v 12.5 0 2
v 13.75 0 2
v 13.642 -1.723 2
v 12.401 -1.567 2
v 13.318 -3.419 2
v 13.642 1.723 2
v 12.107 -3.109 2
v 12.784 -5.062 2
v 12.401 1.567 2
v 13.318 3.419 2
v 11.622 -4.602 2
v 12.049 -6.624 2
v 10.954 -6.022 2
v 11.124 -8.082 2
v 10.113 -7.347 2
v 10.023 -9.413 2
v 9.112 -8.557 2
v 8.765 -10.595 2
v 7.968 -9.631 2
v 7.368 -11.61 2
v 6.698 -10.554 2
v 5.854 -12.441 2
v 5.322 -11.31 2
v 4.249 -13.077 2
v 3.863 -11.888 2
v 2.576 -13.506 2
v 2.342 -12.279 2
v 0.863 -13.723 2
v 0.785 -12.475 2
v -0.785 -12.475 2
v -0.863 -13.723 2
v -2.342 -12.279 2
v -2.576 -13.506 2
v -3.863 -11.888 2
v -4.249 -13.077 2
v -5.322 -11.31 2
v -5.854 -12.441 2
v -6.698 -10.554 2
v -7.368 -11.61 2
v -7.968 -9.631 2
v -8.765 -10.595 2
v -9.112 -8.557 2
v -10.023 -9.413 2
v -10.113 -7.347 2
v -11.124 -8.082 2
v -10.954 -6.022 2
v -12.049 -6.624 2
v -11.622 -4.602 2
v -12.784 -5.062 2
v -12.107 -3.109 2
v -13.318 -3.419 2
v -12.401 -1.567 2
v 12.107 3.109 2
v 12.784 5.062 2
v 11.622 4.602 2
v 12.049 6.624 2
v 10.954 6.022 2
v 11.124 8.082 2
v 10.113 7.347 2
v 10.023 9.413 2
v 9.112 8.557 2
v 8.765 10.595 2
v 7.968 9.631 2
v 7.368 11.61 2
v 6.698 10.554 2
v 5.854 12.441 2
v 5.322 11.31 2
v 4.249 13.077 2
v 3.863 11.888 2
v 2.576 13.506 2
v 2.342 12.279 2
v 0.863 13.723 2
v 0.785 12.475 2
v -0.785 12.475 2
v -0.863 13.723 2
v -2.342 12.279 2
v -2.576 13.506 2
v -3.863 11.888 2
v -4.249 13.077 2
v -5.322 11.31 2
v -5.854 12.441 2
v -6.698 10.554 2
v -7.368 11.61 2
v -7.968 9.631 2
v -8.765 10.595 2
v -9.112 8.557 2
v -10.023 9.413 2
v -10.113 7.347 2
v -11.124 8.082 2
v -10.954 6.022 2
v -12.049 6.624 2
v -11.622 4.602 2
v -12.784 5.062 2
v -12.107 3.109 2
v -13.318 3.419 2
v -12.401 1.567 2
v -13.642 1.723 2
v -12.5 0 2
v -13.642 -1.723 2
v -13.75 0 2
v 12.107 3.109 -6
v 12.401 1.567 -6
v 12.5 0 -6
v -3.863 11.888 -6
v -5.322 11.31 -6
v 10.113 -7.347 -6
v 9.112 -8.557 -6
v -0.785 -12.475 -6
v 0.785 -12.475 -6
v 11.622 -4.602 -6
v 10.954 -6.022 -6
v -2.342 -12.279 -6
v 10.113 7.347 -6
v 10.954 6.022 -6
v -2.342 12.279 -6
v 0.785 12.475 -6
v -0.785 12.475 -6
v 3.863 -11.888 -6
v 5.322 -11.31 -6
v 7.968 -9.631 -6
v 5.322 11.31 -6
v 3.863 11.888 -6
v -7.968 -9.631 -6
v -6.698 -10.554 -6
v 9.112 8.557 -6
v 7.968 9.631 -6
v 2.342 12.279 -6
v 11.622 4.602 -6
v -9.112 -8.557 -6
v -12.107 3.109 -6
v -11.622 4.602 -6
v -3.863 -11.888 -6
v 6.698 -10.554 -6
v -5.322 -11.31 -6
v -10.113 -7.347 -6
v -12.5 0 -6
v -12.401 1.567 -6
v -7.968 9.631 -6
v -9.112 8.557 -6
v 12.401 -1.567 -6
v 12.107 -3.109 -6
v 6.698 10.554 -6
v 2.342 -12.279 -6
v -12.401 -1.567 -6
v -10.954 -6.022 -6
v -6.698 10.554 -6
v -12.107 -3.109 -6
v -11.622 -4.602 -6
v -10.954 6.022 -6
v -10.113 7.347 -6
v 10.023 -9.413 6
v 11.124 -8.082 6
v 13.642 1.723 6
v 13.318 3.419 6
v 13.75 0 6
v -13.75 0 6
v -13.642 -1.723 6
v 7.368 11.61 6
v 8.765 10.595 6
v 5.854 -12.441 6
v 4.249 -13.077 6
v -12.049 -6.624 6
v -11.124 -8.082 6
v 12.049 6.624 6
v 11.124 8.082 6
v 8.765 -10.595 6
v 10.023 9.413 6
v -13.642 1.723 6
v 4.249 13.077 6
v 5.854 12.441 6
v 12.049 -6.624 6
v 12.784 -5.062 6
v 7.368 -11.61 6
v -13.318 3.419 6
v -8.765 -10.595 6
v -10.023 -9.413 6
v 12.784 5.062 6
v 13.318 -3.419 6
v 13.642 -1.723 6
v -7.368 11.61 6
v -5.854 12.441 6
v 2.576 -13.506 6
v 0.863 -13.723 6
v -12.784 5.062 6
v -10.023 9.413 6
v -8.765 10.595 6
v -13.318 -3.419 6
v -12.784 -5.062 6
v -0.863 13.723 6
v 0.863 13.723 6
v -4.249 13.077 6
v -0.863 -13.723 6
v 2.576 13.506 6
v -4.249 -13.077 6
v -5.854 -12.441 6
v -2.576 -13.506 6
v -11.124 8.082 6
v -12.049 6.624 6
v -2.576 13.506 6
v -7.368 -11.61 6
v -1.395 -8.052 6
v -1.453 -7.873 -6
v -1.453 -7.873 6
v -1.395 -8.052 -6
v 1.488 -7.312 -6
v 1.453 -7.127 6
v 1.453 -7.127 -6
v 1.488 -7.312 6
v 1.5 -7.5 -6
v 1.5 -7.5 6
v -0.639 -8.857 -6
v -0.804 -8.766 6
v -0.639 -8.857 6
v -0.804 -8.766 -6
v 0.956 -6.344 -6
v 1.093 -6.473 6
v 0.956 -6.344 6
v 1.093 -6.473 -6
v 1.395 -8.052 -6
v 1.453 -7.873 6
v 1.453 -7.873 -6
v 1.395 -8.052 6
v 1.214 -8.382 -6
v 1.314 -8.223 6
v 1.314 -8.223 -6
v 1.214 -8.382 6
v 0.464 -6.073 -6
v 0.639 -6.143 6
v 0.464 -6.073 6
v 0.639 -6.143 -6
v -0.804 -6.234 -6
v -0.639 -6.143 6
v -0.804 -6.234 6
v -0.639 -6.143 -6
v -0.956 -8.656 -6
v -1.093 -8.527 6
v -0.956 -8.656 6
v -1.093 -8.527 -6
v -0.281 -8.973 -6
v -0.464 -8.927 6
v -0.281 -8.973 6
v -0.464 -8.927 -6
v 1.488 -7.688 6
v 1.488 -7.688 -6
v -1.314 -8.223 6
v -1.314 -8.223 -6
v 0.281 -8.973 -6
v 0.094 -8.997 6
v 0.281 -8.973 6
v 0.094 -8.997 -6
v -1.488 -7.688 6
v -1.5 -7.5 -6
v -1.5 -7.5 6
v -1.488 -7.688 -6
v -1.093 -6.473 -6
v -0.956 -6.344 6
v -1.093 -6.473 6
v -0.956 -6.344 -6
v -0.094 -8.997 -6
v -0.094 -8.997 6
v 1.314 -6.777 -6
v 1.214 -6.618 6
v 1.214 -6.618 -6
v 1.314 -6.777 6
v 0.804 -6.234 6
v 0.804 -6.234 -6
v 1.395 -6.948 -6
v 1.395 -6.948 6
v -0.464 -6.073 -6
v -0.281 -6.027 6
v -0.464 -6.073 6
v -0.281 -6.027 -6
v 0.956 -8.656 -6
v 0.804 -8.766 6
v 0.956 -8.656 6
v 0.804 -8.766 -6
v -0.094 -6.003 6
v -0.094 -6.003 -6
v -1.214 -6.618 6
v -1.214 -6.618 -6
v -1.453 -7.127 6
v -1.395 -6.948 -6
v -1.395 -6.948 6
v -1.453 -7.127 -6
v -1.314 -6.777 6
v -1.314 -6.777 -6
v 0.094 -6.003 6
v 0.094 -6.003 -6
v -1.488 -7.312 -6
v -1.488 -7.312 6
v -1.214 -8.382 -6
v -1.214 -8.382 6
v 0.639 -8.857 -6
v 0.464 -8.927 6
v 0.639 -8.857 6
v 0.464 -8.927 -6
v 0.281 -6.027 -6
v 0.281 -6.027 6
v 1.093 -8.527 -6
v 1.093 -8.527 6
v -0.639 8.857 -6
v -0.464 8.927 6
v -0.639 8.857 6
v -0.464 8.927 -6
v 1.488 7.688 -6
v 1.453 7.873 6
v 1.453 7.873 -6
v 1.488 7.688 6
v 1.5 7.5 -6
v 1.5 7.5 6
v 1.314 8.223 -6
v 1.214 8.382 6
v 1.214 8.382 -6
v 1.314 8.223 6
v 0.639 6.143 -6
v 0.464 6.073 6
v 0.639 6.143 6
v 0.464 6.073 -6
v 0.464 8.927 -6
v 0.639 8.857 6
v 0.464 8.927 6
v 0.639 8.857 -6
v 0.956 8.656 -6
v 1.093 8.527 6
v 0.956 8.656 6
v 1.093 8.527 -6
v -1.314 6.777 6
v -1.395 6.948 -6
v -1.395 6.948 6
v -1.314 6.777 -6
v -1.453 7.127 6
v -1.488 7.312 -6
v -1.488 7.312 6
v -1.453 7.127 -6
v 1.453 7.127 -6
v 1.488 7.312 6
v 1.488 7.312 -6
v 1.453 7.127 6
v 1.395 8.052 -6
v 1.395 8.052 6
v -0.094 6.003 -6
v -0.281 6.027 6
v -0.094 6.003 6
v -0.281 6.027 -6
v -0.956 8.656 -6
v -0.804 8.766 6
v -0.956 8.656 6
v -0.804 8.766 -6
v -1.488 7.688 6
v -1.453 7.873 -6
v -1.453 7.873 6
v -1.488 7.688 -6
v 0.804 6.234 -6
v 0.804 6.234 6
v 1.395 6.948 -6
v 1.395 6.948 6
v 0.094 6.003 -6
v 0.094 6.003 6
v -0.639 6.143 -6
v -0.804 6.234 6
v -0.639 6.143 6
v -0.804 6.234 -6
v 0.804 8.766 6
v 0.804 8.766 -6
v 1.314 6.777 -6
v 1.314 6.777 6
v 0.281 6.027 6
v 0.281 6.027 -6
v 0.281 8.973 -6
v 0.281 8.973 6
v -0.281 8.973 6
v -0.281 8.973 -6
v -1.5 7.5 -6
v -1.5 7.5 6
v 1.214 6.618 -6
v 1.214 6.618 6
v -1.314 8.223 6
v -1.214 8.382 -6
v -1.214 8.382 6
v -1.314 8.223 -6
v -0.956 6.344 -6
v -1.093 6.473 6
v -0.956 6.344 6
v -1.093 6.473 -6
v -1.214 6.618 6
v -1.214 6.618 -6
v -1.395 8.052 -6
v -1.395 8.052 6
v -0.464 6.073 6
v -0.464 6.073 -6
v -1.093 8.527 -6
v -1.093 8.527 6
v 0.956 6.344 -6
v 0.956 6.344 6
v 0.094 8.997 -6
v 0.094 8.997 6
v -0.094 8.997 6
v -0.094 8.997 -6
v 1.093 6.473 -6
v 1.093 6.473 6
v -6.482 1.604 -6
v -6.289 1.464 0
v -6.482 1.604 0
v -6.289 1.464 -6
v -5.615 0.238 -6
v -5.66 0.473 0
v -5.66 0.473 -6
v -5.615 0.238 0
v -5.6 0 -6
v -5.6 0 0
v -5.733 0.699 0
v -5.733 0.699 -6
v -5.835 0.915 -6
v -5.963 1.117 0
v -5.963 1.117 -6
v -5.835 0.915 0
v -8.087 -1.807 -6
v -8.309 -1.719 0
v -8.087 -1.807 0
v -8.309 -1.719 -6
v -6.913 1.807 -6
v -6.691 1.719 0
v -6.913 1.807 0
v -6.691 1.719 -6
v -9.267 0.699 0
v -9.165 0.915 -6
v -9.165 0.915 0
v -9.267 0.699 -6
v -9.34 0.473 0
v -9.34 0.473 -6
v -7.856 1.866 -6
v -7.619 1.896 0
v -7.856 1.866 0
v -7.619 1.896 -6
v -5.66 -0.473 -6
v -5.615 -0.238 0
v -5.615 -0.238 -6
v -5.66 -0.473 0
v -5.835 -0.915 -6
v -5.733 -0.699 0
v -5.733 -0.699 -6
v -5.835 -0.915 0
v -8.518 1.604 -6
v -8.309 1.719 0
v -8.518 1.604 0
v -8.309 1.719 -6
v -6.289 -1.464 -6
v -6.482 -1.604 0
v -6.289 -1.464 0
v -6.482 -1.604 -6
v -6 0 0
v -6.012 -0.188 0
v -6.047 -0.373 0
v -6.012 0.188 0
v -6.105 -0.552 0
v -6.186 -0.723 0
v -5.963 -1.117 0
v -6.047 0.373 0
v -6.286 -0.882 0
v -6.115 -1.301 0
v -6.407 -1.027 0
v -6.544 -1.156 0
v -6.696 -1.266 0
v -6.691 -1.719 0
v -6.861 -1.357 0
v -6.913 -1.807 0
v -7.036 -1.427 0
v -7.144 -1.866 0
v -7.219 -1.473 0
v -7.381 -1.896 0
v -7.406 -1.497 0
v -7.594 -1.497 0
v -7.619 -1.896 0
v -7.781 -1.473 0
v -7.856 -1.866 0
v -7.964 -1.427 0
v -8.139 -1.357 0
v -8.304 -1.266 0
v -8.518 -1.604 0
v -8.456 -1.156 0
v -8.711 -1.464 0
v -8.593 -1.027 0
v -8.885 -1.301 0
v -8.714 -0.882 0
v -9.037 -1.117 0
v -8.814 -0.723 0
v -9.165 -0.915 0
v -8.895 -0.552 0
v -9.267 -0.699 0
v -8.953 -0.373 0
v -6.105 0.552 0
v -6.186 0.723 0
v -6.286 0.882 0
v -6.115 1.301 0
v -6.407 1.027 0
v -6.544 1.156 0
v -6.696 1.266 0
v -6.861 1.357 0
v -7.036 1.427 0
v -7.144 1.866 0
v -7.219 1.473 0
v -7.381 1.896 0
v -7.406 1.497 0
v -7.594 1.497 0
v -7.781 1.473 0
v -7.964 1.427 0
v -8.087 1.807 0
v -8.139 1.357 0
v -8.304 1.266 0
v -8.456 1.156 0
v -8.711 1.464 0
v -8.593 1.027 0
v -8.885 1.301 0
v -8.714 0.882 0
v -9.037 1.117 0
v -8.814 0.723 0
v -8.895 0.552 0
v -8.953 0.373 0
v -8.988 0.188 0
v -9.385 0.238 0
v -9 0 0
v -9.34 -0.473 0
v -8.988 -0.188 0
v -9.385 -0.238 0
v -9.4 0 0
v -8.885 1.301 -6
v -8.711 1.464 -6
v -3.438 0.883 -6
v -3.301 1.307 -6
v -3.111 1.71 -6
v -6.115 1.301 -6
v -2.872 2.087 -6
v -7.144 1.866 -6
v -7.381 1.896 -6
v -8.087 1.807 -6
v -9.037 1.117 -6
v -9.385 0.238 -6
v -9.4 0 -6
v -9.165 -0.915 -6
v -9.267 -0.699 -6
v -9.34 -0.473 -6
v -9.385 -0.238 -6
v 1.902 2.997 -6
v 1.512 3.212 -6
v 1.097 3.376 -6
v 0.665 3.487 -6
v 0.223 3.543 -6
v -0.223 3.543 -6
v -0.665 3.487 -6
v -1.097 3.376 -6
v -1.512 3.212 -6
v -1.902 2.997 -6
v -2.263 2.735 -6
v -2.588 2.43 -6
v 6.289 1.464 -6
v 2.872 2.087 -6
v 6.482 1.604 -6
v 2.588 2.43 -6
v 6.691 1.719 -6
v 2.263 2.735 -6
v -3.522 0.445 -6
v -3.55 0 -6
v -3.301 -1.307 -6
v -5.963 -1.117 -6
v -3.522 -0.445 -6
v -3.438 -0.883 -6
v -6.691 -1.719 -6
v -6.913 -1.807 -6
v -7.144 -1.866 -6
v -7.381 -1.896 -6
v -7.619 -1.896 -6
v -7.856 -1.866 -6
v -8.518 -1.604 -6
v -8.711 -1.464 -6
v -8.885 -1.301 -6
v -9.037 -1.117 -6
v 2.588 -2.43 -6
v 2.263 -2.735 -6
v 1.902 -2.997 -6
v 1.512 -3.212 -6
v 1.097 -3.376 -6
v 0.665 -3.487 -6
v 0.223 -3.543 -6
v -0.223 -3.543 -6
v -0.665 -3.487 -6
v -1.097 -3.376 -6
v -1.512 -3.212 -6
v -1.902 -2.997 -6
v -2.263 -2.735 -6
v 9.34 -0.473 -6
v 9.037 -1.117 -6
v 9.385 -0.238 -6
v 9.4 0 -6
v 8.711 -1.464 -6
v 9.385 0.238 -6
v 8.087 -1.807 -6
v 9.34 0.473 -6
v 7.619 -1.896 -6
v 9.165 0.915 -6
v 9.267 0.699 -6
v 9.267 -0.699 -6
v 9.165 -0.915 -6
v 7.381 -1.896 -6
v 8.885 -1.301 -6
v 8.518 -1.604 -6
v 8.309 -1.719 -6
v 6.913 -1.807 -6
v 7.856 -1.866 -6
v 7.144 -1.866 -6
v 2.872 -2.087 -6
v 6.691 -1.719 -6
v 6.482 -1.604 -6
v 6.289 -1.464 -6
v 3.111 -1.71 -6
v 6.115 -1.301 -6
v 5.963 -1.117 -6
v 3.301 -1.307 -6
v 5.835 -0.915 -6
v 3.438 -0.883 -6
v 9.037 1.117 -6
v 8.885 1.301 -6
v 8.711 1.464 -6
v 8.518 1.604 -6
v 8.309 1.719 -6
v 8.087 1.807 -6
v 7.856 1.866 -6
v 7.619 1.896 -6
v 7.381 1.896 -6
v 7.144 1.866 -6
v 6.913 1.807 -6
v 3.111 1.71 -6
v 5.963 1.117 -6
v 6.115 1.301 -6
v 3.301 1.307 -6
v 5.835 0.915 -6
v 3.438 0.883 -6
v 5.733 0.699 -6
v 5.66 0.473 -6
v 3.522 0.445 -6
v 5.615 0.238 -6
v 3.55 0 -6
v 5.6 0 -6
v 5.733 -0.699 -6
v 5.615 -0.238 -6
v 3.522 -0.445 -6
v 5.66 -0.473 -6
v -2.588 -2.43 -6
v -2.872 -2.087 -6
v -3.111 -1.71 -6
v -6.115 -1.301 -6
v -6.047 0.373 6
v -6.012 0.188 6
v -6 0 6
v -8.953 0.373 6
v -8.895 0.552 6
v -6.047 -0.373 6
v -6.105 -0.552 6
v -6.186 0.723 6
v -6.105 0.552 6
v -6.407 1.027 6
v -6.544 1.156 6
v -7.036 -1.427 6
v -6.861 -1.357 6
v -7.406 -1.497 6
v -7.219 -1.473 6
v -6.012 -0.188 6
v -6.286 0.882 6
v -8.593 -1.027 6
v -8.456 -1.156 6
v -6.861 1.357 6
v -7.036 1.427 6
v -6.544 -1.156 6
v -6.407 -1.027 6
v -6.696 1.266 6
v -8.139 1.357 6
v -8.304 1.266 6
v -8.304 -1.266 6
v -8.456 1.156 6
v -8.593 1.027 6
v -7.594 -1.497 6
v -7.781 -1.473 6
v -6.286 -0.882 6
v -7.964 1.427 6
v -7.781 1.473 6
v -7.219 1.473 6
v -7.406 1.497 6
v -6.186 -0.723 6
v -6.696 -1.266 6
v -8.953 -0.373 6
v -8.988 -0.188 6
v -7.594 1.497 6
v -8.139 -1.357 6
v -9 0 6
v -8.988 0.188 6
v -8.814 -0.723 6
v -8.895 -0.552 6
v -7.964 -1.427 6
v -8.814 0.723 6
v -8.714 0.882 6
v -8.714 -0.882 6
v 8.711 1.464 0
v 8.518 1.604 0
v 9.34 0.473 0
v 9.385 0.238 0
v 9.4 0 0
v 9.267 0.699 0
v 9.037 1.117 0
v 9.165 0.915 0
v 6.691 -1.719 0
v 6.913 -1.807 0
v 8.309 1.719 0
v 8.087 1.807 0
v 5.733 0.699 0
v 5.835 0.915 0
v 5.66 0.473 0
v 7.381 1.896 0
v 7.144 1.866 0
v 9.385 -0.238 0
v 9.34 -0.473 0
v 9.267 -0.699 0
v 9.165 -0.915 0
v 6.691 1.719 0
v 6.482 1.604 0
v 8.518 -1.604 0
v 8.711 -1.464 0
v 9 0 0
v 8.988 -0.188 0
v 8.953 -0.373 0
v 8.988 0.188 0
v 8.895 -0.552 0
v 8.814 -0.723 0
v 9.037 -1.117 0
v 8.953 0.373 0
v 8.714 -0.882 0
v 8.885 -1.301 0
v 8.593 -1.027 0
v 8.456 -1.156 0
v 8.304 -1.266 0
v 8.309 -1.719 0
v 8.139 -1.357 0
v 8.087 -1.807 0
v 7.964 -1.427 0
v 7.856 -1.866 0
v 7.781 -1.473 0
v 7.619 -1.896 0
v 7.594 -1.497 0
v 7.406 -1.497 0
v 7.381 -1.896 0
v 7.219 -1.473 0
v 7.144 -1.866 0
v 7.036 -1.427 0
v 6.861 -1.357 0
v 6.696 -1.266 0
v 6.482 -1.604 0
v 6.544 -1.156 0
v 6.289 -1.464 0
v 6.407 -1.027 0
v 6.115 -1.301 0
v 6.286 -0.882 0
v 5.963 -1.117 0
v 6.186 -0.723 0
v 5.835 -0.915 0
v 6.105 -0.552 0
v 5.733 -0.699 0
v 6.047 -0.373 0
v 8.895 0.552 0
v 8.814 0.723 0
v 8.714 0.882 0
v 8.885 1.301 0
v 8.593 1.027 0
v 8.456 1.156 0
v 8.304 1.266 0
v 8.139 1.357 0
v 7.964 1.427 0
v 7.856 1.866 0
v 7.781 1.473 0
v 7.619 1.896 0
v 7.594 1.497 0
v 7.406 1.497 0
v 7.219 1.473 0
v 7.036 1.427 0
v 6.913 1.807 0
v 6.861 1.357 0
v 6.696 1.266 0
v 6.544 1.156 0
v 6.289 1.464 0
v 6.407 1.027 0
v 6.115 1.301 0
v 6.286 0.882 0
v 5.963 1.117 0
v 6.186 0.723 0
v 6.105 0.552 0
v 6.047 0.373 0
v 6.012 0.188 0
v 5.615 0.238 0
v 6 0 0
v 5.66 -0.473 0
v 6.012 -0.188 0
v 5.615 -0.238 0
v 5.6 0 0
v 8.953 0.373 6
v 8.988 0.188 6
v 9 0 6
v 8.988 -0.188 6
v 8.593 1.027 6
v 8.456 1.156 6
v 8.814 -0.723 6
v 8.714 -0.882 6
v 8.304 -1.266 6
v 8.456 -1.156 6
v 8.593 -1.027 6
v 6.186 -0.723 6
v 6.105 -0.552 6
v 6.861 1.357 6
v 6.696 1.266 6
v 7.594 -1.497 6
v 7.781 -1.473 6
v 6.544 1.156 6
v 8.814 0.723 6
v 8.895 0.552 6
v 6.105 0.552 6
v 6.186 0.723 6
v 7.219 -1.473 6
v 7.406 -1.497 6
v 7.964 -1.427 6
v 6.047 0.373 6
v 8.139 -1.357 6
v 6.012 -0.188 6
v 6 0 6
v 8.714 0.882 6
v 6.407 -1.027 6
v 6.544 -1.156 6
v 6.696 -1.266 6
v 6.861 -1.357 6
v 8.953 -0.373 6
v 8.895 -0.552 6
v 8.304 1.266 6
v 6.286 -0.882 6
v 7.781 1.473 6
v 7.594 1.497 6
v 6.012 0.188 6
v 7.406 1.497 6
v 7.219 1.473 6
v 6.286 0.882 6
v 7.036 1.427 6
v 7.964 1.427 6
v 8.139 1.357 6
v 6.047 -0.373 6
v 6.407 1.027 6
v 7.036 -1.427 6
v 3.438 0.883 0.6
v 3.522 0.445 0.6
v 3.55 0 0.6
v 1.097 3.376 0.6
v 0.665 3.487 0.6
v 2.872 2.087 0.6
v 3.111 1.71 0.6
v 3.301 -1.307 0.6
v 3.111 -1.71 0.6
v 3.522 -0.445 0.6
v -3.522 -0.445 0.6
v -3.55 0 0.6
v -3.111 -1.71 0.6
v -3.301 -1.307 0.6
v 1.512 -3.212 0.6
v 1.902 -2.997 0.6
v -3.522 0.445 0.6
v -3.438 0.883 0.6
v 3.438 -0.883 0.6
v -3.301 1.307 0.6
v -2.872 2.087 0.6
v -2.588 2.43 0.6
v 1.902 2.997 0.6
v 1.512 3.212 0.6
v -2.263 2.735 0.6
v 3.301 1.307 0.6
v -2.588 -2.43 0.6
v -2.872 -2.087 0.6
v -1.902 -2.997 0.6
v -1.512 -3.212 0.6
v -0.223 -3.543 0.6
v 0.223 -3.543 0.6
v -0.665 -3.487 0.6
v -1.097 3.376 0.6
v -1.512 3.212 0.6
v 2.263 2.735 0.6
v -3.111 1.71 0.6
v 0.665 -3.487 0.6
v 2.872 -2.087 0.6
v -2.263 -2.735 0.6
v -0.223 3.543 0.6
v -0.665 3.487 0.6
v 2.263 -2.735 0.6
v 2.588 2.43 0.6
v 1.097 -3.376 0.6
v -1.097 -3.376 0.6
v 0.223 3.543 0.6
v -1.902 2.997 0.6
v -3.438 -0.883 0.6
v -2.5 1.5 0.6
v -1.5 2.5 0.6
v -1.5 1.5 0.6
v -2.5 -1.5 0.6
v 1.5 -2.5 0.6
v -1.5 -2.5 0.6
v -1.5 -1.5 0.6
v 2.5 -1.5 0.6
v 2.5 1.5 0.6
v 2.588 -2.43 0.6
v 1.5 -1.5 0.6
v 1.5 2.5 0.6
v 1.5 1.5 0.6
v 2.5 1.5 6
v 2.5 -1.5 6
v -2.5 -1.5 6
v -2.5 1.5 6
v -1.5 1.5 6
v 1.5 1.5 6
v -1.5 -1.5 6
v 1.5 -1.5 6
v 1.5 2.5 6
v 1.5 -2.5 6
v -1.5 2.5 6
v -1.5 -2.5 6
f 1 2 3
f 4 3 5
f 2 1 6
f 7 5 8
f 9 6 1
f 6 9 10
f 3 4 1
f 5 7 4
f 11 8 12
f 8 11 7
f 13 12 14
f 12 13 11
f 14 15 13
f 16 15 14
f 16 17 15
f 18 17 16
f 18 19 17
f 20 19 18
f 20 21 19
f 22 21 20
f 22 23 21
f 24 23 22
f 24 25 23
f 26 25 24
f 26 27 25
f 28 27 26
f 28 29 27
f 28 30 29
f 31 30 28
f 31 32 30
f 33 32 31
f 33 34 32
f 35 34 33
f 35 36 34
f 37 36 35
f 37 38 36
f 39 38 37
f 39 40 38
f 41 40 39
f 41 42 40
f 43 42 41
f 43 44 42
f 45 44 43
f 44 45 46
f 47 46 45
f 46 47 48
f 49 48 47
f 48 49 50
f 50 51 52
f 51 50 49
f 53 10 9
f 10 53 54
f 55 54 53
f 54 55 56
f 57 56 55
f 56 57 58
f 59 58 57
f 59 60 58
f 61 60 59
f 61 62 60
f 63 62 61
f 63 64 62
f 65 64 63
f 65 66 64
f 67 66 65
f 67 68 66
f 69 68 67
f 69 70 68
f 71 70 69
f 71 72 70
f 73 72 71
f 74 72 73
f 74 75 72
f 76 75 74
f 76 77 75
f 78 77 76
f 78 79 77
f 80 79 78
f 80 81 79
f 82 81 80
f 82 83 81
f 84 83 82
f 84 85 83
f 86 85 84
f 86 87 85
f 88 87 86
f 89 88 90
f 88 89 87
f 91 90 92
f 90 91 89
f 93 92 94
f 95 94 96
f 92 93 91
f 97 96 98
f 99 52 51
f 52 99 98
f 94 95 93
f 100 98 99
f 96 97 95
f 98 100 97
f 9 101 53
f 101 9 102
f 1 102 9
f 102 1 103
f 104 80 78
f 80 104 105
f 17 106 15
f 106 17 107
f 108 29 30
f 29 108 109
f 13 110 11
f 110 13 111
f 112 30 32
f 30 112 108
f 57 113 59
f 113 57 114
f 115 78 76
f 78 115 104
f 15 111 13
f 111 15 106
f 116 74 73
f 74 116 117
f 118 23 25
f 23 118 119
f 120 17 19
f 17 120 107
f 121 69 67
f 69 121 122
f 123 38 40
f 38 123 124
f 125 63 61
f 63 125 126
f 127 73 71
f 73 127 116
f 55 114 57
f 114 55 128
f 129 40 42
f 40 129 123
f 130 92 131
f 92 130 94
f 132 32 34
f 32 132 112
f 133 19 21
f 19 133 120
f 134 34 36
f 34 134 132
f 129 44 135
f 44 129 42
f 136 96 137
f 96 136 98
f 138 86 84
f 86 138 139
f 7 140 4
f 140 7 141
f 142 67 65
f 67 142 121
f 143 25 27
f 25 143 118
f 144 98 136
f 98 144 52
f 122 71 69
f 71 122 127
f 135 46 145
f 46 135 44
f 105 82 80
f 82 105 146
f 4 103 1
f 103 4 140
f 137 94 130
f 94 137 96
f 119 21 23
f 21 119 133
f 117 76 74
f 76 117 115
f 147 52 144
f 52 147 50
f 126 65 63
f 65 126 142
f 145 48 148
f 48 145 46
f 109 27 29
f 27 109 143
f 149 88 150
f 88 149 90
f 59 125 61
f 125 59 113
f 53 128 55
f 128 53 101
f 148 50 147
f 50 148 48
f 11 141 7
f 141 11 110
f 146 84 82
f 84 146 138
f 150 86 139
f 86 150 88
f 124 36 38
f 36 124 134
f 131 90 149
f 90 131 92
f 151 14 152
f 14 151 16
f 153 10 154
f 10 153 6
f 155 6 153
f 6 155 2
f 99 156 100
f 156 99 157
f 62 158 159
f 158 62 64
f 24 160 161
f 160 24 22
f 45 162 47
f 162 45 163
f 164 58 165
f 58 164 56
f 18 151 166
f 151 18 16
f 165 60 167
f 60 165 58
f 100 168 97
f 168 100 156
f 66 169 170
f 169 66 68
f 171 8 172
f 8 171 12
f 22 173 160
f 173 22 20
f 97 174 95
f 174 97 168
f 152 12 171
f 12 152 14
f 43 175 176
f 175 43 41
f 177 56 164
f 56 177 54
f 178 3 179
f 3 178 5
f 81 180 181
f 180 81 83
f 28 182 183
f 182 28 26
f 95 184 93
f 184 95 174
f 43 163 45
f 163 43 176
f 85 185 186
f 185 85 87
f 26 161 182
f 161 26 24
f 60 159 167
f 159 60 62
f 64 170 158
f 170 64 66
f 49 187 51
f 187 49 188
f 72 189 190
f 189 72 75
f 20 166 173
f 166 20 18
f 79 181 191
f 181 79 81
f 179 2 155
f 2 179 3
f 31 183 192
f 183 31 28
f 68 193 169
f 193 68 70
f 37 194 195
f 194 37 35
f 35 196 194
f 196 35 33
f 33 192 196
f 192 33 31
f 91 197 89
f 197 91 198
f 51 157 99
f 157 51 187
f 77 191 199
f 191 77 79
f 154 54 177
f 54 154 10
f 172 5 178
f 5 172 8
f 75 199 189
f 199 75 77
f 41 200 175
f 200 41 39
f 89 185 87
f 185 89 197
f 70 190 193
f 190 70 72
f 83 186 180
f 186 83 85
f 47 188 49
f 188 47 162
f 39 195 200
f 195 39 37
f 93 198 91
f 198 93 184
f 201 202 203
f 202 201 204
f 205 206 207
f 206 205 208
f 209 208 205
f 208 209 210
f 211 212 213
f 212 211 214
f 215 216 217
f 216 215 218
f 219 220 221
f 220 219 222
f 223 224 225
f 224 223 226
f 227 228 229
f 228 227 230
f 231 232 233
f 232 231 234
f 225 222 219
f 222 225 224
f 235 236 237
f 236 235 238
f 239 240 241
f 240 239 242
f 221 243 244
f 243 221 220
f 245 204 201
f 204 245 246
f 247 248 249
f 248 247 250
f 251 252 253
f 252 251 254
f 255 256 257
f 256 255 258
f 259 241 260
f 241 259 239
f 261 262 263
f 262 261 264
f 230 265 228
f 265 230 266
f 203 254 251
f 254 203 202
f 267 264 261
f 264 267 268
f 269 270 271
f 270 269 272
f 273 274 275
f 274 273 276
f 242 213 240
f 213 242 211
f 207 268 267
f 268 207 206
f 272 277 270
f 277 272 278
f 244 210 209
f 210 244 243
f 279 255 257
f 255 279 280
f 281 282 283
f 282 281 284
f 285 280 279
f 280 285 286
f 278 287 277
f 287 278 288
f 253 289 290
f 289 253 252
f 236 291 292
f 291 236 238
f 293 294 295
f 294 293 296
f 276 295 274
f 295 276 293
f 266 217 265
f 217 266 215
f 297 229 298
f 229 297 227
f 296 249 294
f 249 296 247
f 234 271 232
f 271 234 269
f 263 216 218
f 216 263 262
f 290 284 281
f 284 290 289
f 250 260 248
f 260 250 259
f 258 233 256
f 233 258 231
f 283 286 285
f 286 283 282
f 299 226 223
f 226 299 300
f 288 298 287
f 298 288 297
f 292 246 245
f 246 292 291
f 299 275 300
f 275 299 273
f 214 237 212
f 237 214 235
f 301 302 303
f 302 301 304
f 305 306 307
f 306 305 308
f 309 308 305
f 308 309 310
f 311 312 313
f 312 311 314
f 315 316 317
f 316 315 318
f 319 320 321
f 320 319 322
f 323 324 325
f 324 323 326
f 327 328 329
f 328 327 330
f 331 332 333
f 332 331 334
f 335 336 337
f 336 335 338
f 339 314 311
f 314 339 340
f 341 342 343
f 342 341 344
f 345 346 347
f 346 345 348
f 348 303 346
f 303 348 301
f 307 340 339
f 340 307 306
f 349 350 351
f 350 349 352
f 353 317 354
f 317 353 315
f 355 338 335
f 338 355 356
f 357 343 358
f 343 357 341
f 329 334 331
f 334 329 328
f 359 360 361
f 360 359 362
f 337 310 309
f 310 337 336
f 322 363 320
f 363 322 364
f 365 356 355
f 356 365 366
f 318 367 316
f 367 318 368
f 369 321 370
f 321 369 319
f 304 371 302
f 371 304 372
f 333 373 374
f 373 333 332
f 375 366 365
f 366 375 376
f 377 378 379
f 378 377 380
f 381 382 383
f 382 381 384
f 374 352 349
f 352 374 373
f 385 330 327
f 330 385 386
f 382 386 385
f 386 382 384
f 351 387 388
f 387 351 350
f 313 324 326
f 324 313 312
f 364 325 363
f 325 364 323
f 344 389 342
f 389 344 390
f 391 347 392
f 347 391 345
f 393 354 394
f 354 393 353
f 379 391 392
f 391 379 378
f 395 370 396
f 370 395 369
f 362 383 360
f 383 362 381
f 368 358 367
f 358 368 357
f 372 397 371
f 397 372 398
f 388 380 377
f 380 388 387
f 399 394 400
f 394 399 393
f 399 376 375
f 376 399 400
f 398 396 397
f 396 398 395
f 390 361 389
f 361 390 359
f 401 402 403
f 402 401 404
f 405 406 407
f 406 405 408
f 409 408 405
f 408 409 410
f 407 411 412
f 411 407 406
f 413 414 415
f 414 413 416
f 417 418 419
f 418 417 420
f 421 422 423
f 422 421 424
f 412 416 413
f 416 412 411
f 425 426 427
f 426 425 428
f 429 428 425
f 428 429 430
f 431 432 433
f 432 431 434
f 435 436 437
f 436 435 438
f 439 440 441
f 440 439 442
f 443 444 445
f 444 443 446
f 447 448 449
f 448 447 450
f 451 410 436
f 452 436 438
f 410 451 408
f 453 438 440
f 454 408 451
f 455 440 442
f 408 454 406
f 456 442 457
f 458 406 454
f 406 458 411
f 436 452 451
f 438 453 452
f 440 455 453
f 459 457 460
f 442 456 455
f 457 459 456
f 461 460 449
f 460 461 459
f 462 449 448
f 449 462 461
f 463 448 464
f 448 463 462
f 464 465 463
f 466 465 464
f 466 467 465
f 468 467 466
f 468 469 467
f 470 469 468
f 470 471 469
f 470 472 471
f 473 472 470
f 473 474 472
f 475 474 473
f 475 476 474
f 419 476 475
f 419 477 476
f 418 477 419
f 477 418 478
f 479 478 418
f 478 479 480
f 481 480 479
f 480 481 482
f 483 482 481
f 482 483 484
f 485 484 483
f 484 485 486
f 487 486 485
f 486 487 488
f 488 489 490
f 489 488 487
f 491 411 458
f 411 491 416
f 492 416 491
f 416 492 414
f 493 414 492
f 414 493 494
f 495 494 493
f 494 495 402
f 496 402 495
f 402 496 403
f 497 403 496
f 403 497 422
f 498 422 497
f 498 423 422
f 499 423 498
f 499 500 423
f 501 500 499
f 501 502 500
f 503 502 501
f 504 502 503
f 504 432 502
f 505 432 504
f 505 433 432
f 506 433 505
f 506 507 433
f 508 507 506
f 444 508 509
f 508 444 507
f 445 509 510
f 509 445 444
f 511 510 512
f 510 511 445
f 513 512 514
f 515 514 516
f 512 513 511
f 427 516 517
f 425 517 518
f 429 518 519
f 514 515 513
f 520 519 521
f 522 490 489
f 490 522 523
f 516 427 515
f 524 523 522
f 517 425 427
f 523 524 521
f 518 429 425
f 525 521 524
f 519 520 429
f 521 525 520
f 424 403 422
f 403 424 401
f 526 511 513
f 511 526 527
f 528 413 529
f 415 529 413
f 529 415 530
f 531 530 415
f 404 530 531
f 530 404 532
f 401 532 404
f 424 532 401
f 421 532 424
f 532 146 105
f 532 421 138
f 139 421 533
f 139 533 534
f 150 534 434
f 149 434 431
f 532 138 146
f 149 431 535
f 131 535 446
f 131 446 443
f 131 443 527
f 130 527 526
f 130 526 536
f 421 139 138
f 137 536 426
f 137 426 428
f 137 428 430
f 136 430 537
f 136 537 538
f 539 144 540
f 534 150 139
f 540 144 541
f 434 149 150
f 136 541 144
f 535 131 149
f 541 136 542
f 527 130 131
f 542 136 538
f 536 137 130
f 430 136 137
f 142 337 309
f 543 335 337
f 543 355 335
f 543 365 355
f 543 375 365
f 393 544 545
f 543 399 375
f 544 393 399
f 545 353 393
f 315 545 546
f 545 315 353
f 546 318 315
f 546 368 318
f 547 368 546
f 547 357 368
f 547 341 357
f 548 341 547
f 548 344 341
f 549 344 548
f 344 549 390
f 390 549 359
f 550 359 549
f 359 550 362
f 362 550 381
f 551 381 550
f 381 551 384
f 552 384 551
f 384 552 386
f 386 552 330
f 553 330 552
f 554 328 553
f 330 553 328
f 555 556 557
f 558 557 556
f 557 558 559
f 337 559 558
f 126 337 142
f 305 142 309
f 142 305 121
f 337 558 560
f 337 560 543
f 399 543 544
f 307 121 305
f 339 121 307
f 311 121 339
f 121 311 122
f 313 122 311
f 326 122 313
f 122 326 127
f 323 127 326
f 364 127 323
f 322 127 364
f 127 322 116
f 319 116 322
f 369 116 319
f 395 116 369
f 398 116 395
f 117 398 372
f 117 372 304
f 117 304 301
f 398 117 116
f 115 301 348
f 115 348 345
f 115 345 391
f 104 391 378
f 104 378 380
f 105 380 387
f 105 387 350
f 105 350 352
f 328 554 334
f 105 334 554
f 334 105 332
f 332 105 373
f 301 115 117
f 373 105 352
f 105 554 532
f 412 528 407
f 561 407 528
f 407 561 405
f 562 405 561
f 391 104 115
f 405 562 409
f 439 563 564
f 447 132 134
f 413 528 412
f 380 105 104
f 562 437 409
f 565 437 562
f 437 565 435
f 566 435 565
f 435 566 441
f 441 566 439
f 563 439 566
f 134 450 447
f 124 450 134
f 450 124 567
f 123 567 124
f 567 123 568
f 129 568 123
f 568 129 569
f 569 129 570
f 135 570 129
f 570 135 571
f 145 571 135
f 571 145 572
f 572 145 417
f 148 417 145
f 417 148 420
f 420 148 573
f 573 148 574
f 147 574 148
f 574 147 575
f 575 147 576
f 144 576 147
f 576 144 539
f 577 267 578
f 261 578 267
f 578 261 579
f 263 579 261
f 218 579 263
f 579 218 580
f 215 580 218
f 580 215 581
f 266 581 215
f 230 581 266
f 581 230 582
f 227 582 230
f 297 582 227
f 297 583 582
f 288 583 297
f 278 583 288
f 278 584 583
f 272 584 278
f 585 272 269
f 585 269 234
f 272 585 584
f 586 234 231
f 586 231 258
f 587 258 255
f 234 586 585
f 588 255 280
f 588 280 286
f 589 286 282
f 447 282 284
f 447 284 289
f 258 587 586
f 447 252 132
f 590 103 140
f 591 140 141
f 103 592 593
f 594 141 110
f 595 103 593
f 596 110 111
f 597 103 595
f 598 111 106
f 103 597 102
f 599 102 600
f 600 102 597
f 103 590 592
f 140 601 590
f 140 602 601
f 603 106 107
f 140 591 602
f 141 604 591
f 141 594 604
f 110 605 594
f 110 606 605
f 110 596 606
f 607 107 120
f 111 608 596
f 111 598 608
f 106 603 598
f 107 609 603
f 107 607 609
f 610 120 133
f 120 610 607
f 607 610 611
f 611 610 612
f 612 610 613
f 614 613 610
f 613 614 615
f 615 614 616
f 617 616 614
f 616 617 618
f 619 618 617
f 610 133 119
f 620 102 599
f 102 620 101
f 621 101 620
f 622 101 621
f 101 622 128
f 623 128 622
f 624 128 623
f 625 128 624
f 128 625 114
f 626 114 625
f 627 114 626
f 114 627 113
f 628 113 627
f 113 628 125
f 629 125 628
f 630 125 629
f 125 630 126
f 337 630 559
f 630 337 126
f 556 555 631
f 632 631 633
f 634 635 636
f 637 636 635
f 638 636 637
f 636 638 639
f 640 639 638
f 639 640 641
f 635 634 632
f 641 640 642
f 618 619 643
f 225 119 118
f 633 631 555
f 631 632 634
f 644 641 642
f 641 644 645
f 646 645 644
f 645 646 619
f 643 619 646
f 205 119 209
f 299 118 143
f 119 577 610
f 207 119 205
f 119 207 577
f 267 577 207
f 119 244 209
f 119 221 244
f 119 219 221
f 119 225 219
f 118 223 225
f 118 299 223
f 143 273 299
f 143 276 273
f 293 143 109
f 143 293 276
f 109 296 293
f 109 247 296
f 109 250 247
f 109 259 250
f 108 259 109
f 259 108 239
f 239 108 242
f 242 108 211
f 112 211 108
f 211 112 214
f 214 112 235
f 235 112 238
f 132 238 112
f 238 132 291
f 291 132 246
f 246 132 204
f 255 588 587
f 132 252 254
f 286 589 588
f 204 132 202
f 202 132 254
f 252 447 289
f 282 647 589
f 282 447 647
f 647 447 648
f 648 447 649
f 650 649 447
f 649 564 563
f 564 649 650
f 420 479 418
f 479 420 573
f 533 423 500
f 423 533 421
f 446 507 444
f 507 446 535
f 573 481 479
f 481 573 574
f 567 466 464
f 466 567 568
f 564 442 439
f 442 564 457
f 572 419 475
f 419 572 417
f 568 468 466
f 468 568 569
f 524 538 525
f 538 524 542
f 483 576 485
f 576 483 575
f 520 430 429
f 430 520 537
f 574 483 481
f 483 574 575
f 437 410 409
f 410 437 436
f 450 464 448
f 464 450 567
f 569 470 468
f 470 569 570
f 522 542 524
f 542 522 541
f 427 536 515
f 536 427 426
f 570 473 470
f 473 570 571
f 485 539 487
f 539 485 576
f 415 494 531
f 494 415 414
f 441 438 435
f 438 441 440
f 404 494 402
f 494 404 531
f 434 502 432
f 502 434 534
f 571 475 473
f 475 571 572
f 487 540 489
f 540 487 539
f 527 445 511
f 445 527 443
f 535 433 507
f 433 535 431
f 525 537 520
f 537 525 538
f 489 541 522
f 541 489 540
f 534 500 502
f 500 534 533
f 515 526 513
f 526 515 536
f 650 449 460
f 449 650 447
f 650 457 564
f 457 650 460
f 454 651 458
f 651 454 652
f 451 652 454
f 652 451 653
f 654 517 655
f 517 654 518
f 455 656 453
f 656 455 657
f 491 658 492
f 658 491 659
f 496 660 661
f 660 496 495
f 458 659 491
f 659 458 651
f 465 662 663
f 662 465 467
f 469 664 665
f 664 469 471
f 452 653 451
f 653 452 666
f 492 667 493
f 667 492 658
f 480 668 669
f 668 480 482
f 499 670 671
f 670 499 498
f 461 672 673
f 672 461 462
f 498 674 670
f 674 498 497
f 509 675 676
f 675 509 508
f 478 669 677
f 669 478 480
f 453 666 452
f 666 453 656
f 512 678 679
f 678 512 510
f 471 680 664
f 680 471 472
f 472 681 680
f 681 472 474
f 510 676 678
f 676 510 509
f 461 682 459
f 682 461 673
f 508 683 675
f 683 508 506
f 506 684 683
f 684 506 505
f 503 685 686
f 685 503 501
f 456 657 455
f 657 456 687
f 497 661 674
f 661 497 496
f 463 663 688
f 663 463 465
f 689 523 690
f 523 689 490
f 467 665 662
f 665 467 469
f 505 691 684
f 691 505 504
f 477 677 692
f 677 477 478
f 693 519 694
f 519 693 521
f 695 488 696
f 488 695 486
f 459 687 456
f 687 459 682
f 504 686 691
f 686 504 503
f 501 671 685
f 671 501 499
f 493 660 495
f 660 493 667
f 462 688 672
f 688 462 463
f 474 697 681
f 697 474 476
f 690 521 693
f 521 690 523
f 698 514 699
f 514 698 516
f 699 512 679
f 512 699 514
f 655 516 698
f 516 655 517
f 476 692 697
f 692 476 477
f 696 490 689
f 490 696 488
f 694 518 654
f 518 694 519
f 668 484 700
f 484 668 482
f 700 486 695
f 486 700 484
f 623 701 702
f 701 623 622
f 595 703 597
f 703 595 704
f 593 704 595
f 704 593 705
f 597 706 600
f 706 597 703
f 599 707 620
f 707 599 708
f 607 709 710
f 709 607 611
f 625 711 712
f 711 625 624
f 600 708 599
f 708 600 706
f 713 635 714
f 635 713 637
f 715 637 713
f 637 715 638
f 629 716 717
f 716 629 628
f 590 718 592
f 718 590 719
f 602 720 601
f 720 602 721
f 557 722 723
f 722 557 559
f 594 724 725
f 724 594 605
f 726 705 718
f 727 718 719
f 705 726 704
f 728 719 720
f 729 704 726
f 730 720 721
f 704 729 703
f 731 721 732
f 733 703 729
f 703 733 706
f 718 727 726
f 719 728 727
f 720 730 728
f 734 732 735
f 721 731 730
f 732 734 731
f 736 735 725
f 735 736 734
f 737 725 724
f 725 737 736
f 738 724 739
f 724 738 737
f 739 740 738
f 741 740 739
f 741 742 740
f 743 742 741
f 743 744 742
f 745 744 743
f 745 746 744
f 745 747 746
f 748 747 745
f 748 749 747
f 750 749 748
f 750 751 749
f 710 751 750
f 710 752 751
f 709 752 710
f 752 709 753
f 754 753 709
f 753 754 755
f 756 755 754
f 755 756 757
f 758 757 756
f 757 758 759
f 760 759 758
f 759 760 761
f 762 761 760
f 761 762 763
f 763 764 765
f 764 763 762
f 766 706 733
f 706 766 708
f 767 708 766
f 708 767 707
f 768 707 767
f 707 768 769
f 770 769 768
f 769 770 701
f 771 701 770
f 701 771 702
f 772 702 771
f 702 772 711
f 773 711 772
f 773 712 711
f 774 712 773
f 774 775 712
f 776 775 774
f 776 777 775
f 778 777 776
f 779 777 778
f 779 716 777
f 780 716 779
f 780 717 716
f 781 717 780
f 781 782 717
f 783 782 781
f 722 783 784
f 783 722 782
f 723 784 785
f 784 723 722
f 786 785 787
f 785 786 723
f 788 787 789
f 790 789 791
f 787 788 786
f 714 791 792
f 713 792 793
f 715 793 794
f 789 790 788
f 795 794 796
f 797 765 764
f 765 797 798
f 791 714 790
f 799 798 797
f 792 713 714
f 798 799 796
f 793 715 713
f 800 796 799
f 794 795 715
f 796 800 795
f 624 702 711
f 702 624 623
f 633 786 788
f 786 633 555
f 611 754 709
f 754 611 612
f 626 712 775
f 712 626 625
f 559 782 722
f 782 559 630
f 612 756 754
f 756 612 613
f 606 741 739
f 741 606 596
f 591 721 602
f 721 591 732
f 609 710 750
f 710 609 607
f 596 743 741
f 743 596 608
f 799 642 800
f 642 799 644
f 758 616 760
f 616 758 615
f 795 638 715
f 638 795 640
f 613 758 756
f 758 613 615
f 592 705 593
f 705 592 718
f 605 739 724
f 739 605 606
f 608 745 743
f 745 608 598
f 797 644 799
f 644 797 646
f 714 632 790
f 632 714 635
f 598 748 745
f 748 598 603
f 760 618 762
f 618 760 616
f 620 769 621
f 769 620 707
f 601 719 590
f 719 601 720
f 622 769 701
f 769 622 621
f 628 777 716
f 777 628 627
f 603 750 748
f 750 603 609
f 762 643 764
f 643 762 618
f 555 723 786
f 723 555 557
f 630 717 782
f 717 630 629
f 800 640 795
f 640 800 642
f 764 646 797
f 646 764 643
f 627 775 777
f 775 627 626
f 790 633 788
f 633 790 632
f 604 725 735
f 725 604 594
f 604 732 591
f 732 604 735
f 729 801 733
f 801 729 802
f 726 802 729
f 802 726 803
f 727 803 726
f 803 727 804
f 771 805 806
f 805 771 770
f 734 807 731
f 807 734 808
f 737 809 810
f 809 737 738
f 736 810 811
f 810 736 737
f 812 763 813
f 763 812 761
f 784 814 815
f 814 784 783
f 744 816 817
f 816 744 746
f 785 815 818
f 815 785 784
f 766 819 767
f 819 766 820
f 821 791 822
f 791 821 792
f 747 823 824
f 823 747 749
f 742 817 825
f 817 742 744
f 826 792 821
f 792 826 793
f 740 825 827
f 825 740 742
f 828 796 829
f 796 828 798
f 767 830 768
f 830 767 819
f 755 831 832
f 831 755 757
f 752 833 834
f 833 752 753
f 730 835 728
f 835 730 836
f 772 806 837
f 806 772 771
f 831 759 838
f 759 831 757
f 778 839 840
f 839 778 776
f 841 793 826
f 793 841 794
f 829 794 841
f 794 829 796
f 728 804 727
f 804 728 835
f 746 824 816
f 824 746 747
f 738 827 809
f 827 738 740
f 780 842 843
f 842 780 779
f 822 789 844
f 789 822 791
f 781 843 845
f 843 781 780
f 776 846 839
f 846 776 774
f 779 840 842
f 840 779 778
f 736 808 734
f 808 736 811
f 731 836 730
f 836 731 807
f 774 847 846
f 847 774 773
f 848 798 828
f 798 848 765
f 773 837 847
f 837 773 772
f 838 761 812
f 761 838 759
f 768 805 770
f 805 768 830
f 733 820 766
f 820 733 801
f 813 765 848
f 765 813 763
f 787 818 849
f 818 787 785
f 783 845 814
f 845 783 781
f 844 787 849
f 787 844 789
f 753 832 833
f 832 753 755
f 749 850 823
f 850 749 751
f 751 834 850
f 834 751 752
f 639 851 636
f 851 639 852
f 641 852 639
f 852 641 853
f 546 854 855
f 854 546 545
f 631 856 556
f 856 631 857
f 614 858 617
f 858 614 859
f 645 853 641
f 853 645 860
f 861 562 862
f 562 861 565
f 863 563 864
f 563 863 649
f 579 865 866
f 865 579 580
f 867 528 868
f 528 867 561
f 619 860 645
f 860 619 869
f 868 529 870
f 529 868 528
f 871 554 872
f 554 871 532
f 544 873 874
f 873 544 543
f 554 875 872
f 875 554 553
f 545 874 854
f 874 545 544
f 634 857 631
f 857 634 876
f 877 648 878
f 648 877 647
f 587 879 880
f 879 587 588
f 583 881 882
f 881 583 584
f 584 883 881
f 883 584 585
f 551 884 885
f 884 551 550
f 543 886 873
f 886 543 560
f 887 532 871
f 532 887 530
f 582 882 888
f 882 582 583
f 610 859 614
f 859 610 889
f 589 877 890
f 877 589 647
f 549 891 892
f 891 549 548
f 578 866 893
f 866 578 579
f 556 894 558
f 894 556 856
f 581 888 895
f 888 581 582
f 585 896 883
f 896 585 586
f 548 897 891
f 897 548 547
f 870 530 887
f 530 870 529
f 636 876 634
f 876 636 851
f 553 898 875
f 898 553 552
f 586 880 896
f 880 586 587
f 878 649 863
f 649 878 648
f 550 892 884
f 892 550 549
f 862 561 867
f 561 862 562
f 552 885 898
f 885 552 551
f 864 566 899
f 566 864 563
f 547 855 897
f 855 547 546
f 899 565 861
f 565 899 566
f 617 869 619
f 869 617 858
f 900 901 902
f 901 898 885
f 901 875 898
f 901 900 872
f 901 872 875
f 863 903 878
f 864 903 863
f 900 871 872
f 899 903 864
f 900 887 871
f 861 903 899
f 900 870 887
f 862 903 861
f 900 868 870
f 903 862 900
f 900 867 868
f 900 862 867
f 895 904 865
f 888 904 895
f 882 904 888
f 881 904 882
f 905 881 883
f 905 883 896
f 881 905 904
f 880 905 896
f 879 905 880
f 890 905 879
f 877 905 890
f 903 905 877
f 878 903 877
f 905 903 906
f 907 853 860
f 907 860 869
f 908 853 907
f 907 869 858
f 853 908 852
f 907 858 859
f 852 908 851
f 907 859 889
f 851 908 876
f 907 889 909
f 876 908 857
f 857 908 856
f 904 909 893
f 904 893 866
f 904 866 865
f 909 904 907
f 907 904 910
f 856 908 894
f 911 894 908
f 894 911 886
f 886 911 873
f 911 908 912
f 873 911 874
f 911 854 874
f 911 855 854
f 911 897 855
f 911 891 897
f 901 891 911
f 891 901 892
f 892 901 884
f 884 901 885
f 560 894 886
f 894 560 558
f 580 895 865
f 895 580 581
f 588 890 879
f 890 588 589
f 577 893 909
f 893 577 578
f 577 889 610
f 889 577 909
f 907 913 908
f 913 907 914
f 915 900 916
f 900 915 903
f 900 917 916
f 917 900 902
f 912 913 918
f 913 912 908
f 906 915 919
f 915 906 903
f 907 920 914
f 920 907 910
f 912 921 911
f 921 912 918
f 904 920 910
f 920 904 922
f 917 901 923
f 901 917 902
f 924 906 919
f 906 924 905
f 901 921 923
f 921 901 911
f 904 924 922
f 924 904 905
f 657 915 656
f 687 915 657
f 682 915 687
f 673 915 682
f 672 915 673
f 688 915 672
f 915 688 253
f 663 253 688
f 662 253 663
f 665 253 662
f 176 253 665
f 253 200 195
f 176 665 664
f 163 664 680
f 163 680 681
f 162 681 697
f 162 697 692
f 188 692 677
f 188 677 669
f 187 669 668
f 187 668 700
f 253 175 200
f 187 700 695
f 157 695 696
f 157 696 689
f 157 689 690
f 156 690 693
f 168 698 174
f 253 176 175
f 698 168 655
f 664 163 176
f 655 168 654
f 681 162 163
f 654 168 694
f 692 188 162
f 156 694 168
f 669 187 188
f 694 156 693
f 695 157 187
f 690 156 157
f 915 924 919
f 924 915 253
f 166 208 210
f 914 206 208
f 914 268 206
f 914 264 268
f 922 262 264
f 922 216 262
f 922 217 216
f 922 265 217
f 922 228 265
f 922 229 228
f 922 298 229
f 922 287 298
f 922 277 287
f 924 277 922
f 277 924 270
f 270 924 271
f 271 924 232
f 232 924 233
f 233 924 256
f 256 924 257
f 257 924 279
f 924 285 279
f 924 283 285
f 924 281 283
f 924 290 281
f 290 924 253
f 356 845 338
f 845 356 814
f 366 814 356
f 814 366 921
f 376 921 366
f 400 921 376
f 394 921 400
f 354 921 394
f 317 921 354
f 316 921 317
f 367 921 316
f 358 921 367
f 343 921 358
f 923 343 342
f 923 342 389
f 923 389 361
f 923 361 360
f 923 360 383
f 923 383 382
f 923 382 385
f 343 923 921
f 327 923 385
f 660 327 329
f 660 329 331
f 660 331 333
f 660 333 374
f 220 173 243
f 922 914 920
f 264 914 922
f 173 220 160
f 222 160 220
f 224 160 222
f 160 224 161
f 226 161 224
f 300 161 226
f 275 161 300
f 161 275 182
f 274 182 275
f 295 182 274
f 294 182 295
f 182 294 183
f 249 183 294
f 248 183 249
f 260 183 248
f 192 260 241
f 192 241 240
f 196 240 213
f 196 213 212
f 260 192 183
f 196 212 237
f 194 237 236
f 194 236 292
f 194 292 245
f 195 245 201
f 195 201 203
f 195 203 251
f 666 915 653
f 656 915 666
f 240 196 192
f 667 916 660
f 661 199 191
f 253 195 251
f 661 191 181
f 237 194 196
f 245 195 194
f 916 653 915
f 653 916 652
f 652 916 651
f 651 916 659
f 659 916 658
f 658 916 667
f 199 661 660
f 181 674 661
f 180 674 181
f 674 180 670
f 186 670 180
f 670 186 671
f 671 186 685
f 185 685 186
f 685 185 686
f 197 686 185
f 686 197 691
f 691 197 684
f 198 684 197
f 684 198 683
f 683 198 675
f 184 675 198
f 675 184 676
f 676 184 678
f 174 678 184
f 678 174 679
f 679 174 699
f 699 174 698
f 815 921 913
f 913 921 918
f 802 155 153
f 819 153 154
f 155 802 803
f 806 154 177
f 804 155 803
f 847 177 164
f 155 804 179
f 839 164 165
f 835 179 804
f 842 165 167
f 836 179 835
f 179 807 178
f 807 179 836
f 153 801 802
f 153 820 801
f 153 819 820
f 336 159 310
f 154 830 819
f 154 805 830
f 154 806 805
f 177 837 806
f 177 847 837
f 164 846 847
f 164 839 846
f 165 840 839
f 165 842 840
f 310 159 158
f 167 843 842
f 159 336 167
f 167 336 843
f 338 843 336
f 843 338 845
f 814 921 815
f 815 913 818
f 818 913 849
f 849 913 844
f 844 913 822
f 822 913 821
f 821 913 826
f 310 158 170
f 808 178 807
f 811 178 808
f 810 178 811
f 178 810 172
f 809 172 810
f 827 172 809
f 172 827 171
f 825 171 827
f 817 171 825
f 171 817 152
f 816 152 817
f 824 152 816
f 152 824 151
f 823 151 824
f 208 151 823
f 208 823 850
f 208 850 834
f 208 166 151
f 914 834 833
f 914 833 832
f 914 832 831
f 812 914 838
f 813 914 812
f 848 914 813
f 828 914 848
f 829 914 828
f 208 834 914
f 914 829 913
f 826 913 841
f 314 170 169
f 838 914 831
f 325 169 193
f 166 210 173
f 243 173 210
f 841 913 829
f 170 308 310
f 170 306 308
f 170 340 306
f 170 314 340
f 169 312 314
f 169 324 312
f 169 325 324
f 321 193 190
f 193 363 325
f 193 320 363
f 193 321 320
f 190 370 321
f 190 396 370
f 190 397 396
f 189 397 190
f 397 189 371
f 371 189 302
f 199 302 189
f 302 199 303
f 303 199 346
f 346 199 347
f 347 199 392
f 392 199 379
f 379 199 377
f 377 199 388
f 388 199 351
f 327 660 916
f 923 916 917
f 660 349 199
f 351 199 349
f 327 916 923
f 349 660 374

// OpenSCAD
$fn = 50;

difference() {
	union() {
		translate(v = [0, 0, 0]) {
			rotate(a = [0, 0, 0]) {
				difference() {
					union() {
						translate(v = [0, 0, -6.0]) {
							cylinder(h = 12, r = 14.5);
						}
					}
					union() {
						translate(v = [0, 0, 0]) {
							rotate(a = [0, 0, 0]) {
								difference() {
									union() {
										translate(v = [0, 0, -2.0]) {
											cylinder(h = 4, r = 16.0);
										}
									}
									union() {
										translate(v = [0, 0, -2.01]) {
											cylinder(h = 4.02, r = 12.5);
										}
									}
								}
							}
						}
						translate(v = [0, 0, -3]) {
							rotate(a = [0, 0, 0]) {
								difference() {
									union() {
										translate(v = [0, 0, -2.0]) {
											cylinder(h = 4, r = 16.0);
										}
									}
									union() {
										translate(v = [0, 0, -2.01]) {
											cylinder(h = 4.02, r = 12.5);
										}
									}
								}
							}
						}
						translate(v = [0, 0, -6]) {
							rotate(a = [0, 0, 0]) {
								difference() {
									union() {
										translate(v = [0, 0, -2.0]) {
											cylinder(h = 4, r = 16.0);
										}
									}
									union() {
										translate(v = [0, 0, -2.01]) {
											cylinder(h = 4.02, r = 12.5);
										}
									}
								}
							}
						}
						translate(v = [0, 0, 0]) {
							rotate(a = [0, 0, 0]) {
								difference() {
									union() {
										translate(v = [0, 0, -21.0]) {
											cylinder(h = 42, r = 14.75);
										}
									}
									union() {
										translate(v = [0, 0, -21.01]) {
											cylinder(h = 42.02, r = 13.75);
										}
									}
								}
							}
						}
						translate(v = [0.0, -7.5, -7.0]) {
							cylinder(h = 14, r = 1.5);
						}
						translate(v = [0.0, 7.5, -7.0]) {
							cylinder(h = 14, r = 1.5);
						}
						translate(v = [-7.5, 0, -6.0]) {
							cylinder(h = 6, r = 1.9);
						}
						translate(v = [-7.5, 0, -7.0]) {
							cylinder(h = 14, r = 1.5);
						}
						translate(v = [7.5, 0, -6.0]) {
							cylinder(h = 6, r = 1.9);
						}
						translate(v = [7.5, 0, -7.0]) {
							cylinder(h = 14, r = 1.5);
						}
						translate(v = [0, 0, -6.000000000000001]) {
							cylinder(h = 6.6, r = 3.55);
						}
						translate(v = [-2.5, -1.5, -7.0]) {
							cube(size = [5, 3, 14]);
						}
						translate(v = [-1.5, -2.5, -7.0]) {
							cube(size = [3, 5, 14]);
						}
					}
				}
			}
		}
	}
	union();
}
